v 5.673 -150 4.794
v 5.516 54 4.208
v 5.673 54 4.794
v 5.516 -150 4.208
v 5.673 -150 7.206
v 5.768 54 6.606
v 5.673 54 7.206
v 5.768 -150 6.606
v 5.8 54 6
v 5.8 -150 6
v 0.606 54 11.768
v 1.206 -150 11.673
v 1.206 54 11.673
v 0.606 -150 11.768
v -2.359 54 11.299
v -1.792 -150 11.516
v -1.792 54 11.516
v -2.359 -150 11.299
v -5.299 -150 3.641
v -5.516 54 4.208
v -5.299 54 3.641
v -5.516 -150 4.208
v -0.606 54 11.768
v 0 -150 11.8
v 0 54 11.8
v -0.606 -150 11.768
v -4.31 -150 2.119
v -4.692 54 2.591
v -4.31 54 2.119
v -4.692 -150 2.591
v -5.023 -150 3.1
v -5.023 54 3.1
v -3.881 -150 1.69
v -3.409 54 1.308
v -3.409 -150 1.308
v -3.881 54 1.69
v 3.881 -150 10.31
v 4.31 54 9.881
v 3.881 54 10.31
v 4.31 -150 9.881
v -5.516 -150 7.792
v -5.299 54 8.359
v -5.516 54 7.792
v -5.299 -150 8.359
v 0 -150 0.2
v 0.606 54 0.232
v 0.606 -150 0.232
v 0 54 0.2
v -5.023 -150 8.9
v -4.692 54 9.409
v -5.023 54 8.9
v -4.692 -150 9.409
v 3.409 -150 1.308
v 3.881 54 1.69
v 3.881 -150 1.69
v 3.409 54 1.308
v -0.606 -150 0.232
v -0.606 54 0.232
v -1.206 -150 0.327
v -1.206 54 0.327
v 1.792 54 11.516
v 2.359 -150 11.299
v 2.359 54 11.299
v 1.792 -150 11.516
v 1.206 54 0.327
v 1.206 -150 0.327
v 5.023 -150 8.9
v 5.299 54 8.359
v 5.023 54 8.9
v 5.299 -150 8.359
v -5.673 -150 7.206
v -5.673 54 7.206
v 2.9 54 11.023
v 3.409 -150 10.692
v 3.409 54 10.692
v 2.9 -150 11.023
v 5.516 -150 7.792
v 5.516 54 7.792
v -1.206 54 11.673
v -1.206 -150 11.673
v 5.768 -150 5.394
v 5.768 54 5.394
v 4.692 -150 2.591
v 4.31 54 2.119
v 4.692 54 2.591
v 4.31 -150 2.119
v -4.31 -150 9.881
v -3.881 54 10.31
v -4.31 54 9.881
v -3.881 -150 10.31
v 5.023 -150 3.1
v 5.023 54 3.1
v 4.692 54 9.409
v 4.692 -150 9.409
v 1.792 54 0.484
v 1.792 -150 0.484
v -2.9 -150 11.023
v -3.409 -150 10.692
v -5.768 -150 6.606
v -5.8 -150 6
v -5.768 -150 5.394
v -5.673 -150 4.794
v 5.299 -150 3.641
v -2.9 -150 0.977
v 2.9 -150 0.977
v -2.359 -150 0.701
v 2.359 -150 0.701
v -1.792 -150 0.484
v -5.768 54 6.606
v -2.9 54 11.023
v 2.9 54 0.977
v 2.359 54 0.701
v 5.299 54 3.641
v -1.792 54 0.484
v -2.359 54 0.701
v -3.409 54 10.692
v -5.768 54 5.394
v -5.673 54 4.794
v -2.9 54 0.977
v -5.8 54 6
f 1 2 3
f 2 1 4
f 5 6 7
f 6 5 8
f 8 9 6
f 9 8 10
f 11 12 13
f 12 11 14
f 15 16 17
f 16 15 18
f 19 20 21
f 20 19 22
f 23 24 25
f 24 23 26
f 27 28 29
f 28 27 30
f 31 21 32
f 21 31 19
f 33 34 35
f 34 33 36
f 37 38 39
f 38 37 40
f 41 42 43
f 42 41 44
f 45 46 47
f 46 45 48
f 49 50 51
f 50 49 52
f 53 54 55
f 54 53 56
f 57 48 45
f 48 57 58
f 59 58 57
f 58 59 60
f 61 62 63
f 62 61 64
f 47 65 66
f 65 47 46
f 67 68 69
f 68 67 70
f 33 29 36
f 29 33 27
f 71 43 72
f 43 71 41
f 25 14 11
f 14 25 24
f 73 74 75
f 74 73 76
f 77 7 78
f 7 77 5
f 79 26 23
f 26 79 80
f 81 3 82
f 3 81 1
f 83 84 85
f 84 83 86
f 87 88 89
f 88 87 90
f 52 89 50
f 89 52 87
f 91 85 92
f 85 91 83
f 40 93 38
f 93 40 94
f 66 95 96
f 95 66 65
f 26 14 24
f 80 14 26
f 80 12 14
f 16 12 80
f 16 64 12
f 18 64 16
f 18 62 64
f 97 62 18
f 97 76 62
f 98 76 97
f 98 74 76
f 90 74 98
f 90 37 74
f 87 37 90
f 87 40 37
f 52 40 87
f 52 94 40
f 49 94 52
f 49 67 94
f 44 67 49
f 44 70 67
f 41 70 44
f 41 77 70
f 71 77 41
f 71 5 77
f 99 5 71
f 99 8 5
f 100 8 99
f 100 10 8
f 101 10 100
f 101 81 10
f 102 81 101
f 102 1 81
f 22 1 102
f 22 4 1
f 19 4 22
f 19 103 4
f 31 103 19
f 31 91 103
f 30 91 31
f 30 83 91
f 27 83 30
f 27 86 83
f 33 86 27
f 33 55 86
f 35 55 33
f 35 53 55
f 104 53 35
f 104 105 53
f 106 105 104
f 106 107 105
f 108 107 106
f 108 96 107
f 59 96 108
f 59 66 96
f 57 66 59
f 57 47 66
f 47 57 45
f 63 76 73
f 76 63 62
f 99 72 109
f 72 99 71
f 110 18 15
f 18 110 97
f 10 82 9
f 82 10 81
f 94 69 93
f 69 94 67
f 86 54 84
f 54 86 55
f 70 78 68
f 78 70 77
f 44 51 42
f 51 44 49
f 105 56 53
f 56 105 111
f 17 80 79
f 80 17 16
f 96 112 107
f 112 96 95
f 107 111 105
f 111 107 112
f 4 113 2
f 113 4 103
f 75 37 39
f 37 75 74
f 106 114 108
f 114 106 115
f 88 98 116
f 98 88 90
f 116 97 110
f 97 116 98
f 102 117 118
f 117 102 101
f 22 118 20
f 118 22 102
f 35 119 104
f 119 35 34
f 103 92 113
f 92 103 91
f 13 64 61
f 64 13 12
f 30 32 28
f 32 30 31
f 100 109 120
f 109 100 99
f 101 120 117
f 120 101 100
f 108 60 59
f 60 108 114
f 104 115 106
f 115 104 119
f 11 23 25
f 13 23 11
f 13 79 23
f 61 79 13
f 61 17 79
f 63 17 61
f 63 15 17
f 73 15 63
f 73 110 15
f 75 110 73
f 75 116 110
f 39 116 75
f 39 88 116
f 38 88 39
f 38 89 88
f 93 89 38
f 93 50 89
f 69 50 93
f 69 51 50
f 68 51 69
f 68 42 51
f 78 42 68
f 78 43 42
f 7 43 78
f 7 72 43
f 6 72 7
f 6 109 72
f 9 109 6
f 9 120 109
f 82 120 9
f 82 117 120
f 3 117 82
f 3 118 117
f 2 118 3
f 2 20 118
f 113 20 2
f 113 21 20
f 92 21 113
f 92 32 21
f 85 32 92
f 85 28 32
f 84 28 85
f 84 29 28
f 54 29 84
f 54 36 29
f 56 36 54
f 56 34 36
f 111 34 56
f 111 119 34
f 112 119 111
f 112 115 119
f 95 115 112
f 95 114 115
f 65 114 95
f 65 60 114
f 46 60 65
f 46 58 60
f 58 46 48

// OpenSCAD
// FIX APPLIED: Increased Rod Diameter to 12mm and Socket Depth to 15mm
// for maximum rigidity and zero wobble.

$fn = 60; 

// --- 1. CONFIGURATION ---

// 0 = ASSEMBLY VIEW 
// 1 = BOX (With Heavy Duty Sockets)
// 2 = GEARS 
// 3 = HANDLE 
// 4 = HEAVY DUTY PILLARS (Print 4 of these)
PART_TO_PRINT = 4; 

// --- TRACTION SETTINGS ---
// 0 = Smooth (Original)
// 1 = O-Ring Groove (Standard #224 O-Ring)
// 2 = Printed "Nubs" Texture 
TRACTION_MODE = 0; 

INCH = 25.4;
wall_thick = 3;
floor_thick = 4;
base_height = 2 * INCH; 

// --- 2. FIXED GEOMETRY ---
orig_gap = 0.5; 
orig_len = (9.75 * INCH) - (wall_thick * 2);
orig_diam = (orig_len - (orig_gap * 3)) / 2;
orig_r = orig_diam / 2;

FIXED_PIN_Y_BACK  =  (orig_r + orig_gap/2);
FIXED_PIN_Y_FRONT = -(orig_r + orig_gap/2);

orig_protrusion = 6;
box_max_y = FIXED_PIN_Y_BACK + orig_r + 3.0 + wall_thick;
box_min_y = (FIXED_PIN_Y_FRONT - orig_r) + orig_protrusion;
final_box_length = box_max_y - box_min_y;
final_box_center_y = (box_max_y + box_min_y) / 2;
final_box_width = (orig_r * 2) + (3.0 * 2) + (wall_thick * 2);

// --- 3. GEAR MATH ---
shrink_amount = 1.5; 
r_main_new = orig_r - shrink_amount;
r_idler = 12; 

dist_centers = r_main_new + r_idler + 0.5; 
y_offset = FIXED_PIN_Y_BACK; 

pitch_val = 280; 

teeth_main  = round((r_main_new * 360) / pitch_val);
teeth_idler = round((r_idler * 360) / pitch_val);

r_main_final  = (teeth_main * pitch_val) / 360;
r_idler_final = (teeth_idler * pitch_val) / 360;

dist_final = r_main_final + r_idler_final + 0.5; 
final_idler_x = sqrt(pow(dist_final, 2) - pow(y_offset, 2));


// --- 4. Z HEIGHTS ---
gear_h = 8;            
spacer_h = 0.0;        
total_stack_h = spacer_h + gear_h; 
drop_amt = 1.2; 
pin_top_z = floor_thick + total_stack_h; 

// --- 5. STACKING SYSTEM PARAMS (HEAVY DUTY) ---
// *** UPDATED FOR STRENGTH ***
stack_pin_r = 6.0;    // 12mm Diameter (Was 8mm) - Much stronger
stack_col_r = 8.5;    // Thicker outer housing to accept the 12mm rod
stack_socket_depth = 15.0; // Deeper sockets (Was 10mm) to stop wobble
fusion_overlap = 2.5; // Slightly more overlap for the heavier column

// *** VERTICAL CLEARANCE FOR BOTTLES ***
stack_clearance = 120; // 120mm space between racks

// Position: External to the wall
stack_x = (final_box_width/2) + stack_col_r - fusion_overlap; 
stack_y = (final_box_length/2) - (final_box_width/2); 


// --- 6. RENDER LOGIC ---

if (PART_TO_PRINT == 0) {
    // ASSEMBLY VIEW: STACKED
    
    // Bottom Unit
    render_full_unit(); 
    
    // Top Unit (Lifted by base_height + clearance)
    translate([0, 0, base_height + stack_clearance]) 
        render_full_unit();
        
    // Show Tall Pillars connecting them
    color("DimGray")
    for (mx = [0, 1]) for (my = [0, 1]) {
        sx = mx == 0 ? -stack_x : stack_x;
        sy = my == 0 ? -stack_y : stack_y;
        
        translate([sx, sy + final_box_center_y, base_height - stack_socket_depth]) 
            render_stacking_pillar();
    }
} 
else if (PART_TO_PRINT == 1) {
    render_box();
}
else if (PART_TO_PRINT == 2) {
    translate([-r_main_final - 2, 0, 0]) gear_unit(teeth_main, r_main_final, gear_h, "Silver");
    translate([r_main_final + 2, 0, 0])  gear_unit(teeth_main, r_main_final, gear_h, "Silver");
    translate([0, r_main_final + r_idler_final + 5, 0]) 
        gear_unit(teeth_idler, r_idler_final, gear_h - drop_amt, "Gold", override_mode=1);
} 
else if (PART_TO_PRINT == 3) {
    render_handle(printing=true);
}
else if (PART_TO_PRINT == 4) {
    // PRINT: TALL STACKING PILLARS (Array of 4)
    // Laying flat for printing strength
    for(i=[0:3]) {
        translate([0, i * 18, stack_pin_r]) 
        rotate([90, 0, 0])
        render_stacking_pillar();
    }
}


// --- MODULES ---

module render_full_unit() {
    render_box();
    translate([0, FIXED_PIN_Y_FRONT, floor_thick]) gear_unit(teeth_main, r_main_final, gear_h, "Silver", show_oring=true);
    translate([0, FIXED_PIN_Y_BACK, floor_thick])  gear_unit(teeth_main, r_main_final, gear_h, "Silver", show_oring=true);
    translate([final_idler_x, 0, floor_thick]) gear_unit(teeth_idler, r_idler_final, gear_h - drop_amt, "Gold", override_mode=1);
    translate([0, 0, pin_top_z]) render_handle(printing=false);
}

module render_stacking_pillar() {
    // Total height = Clearance + (2 * Socket Depth)
    h_total = stack_clearance + (stack_socket_depth * 2);
    r = stack_pin_r - 0.2; // Clearance tolerance for printing
    
    // Main Shaft
    cylinder(r=r, h=h_total);
}

module render_handle(printing) {
    handle_h = base_height - pin_top_z;
    rot_vec = printing ? [180, 0, 0] : [0, 0, 0];
    pos_vec = printing ? [0, 0, handle_h] : [0, 0, 0];
    
    shave_offset = 2.0; 
    cut_len = (FIXED_PIN_Y_BACK - FIXED_PIN_Y_FRONT) + (shave_offset * 2);
    cut_center_y = (FIXED_PIN_Y_BACK + FIXED_PIN_Y_FRONT) / 2;

    cut_depth = 3.0;
    center_dist = FIXED_PIN_Y_BACK - FIXED_PIN_Y_FRONT;
    safety_margin = 5.0; 
    relief_cut_len = center_dist - (safety_margin * 2);

    translate(pos_vec)
    rotate(rot_vec)
    color("Crimson")
    union() {
        difference() {
            intersection() {
                hull() {
                    translate([0, FIXED_PIN_Y_FRONT, 0]) cylinder(r=6, h=handle_h); 
                    translate([0, FIXED_PIN_Y_BACK, 0]) cylinder(r=6, h=handle_h);
                }
                translate([0, cut_center_y, handle_h/2])
                    cube([20, cut_len, handle_h + 10], center=true);
            }
            translate([0, cut_center_y, cut_depth/2]) 
                cube([20, relief_cut_len, cut_depth], center=true);
        }
        translate([0, FIXED_PIN_Y_FRONT, -5]) cylinder(r=2.4, h=5.1); 
        translate([0, FIXED_PIN_Y_BACK, -5]) cylinder(r=2.4, h=5.1);
    }
}

module render_box() {
    translate([0, final_box_center_y, 0]) 
    base_enclosure(final_box_width, final_box_length, base_height);
}

module base_enclosure(w, l, h) {
    cutout_r = orig_r; 
    tight_gap = 1.0; 
    extra_width = 12.0; 
    outer_r = w / 2;
    inner_r = (w - wall_thick*2) / 2;
    
    pin_y_front = FIXED_PIN_Y_FRONT - final_box_center_y;
    pin_y_back  = FIXED_PIN_Y_BACK  - final_box_center_y;

    color("Teal") {
        difference() {
            union() {
                // Outer Hull
                difference() {
                    rounded_rect(w, l, h, outer_r);
                    translate([0, 0, floor_thick]) 
                        rounded_rect(w - wall_thick*2, l - wall_thick*2, h + 10, inner_r);
                    
                    // Front Cutout
                    cut_len = 100;
                    cut_height = gear_h + 20; 
                    translate([0, pin_y_front - (cut_len/2), floor_thick + (cut_height/2)])
                        cube([cutout_r*2 + tight_gap + extra_width, cut_len, cut_height], center=true);
                }
                
                // Finger Rest (Embedded & Lowered)
                translate([0, -l/2, h - 5]) 
                    render_finger_rest();
                
                // --- EXTERNAL SOCKET HOUSINGS ---
                for (mx = [0, 1]) for (my = [0, 1]) {
                    sx = mx == 0 ? -stack_x : stack_x;
                    sy = my == 0 ? -stack_y : stack_y;
                    translate([sx, sy, 0])
                        cylinder(r=stack_col_r, h=h);
                }
            }
            
            // --- SOCKET HOLES (Top and Bottom) ---
            for (mx = [0, 1]) for (my = [0, 1]) {
                sx = mx == 0 ? -stack_x : stack_x;
                sy = my == 0 ? -stack_y : stack_y;
                
                // Top Socket
                translate([sx, sy, h]) {
                    translate([0,0, -stack_socket_depth]) cylinder(r=stack_pin_r, h=stack_socket_depth + 1);
                    translate([0,0, -1]) cylinder(r1=stack_pin_r, r2=stack_pin_r+1, h=1.01); // Chamfer
                }
                
                // Bottom Socket
                translate([sx, sy, -1]) {
                    cylinder(r=stack_pin_r, h=stack_socket_depth + 1);
                    translate([0,0, 0]) cylinder(r1=stack_pin_r+1, r2=stack_pin_r, h=1); // Chamfer
                }
            }
        }
        
        mid_y = (pin_y_front + pin_y_back) / 2;
        dist_to_center = (w/2 - wall_thick);
    
        translate([-(w/2 - wall_thick), mid_y, floor_thick])
            side_filler_shape(pin_y_front, pin_y_back, mid_y, dist_to_center, false, cutout_r);
    
        translate([(w/2 - wall_thick), mid_y, floor_thick])
            side_filler_shape(pin_y_front, pin_y_back, mid_y, dist_to_center, true, cutout_r);
    
        translate([0, pin_y_front, 0]) pin(pin_top_z);
        translate([0, pin_y_back, 0]) pin(pin_top_z);
        translate([final_idler_x, -final_box_center_y, 0]) pin(pin_top_z - drop_amt);
    }
}

module render_finger_rest() {
    rest_w = 30; rest_d = 12; rest_h = 8; embed_depth = 3.0; 
    rotate([0, 0, 180]) hull() {
        translate([-rest_w/2, -embed_depth, -rest_h]) cube([rest_w, embed_depth, rest_h]);
        translate([-rest_w/2, rest_d, -2]) cube([rest_w, 2, 2]);
    }
}

module side_filler_shape(y_f, y_b, y_mid, dist_to_center, is_right, r_cut) {
    filler_h = total_stack_h - drop_amt; 
    block_w = dist_to_center; 
    gear_x_rel = is_right ? -dist_to_center : dist_to_center;
    cube_center_x = is_right ? -block_w/2 : block_w/2;
    tight_gap = 1.0; idler_clearance = 2.5; 
    
    difference() {
        translate([cube_center_x, 0, filler_h/2])
            cube([block_w, abs(y_b - y_f), filler_h], center=true);
        translate([gear_x_rel, y_f - y_mid, -1]) cylinder(r=r_cut + tight_gap, h=filler_h + 10);
        translate([gear_x_rel, y_b - y_mid, -1]) cylinder(r=r_cut + tight_gap, h=filler_h + 10);
        if (is_right) translate([gear_x_rel + final_idler_x, 0, -1]) cylinder(r=r_idler_final + idler_clearance, h=filler_h + 10); 
    }
}

module pin(h_val) {
    difference() {
        cylinder(h=h_val, r=6); 
        translate([0,0, floor_thick]) cylinder(h=h_val + 10, d=5); 
    }
}

module gear_unit(teeth, radius, h_val, col, show_oring=false, override_mode=-1) {
    clearance = 1.0; 
    current_mode = (override_mode > -1) ? override_mode : TRACTION_MODE;
    traction_r_start = 8; traction_r_end = radius - 3; 
    
    color(col) {
        difference() {
            union() {
                difference() {
                    cylinder(r=10, h=spacer_h); 
                    translate([0,0,-1]) cylinder(r=(12+clearance)/2, h=spacer_h+2); 
                }
                translate([0,0, spacer_h]) simple_herringbone_gear(teeth, pitch_val, h_val, 12 + clearance, 0);
                if (current_mode == 2) translate([0, 0, spacer_h + h_val]) traction_nubs(traction_r_start, traction_r_end);
            }
            if (current_mode == 1) {
                groove_w = 3.8; groove_d = 2.0; groove_r_center = 24; 
                translate([0, 0, spacer_h + h_val - groove_d + 0.01]) difference() {
                    cylinder(r=groove_r_center + groove_w/2, h=groove_d+1);
                    translate([0,0,-1]) cylinder(r=groove_r_center - groove_w/2, h=groove_d+5);
                }
            }
        }
    }
    if (show_oring && current_mode == 1) {
        oring_thick = 3.175; groove_r_center = 24; groove_d = 2.0;
        z_pos = spacer_h + h_val - groove_d + (oring_thick/2);
        color("Black") translate([0, 0, z_pos]) rotate_extrude($fn=60) translate([groove_r_center, 0, 0]) circle(r=oring_thick/2, $fn=20);
    }
}

module traction_nubs(r_inner, r_outer) {
    nub_size = 0.8; spacing = 3.0; nub_height = 0.8; 
    linear_extrude(height = nub_height) intersection() {
        difference() { circle(r=r_outer); circle(r=r_inner); }
        for (x = [-r_outer : spacing : r_outer]) for (y = [-r_outer : spacing : r_outer]) translate([x, y]) circle(r=nub_size, $fn=8);
    }
}

module rounded_rect(w, l, h, r) {
    translate([-w/2, -l/2, 0]) hull() {
        translate([r, r, 0]) cylinder(r=r, h=h);
        translate([w-r, r, 0]) cylinder(r=r, h=h);
        translate([w-r, l-r, 0]) cylinder(r=r, h=h);
        translate([r, l-r, 0]) cylinder(r=r, h=h);
    }
}

module simple_herringbone_gear(teeth, pitch_val, h, bore, twist_val) {
    r_pitch = (teeth * pitch_val) / 360;
    tooth_w = (r_pitch * 6.28) / teeth / 2;
    linear_extrude(height=h, twist=twist_val, slices=60, convexity=10) difference() {
        union() {
            circle(r=r_pitch - 1.5);
            for(i=[0:teeth-1]) rotate([0,0, i*(360/teeth)]) translate([0, r_pitch - 1.5, 0]) polygon([[-tooth_w/1.8, -1], [tooth_w/1.8, -1], [tooth_w/3, 3.0], [-tooth_w/3, 3.0]]);
        }
        circle(r=bore/2);
    }
}
